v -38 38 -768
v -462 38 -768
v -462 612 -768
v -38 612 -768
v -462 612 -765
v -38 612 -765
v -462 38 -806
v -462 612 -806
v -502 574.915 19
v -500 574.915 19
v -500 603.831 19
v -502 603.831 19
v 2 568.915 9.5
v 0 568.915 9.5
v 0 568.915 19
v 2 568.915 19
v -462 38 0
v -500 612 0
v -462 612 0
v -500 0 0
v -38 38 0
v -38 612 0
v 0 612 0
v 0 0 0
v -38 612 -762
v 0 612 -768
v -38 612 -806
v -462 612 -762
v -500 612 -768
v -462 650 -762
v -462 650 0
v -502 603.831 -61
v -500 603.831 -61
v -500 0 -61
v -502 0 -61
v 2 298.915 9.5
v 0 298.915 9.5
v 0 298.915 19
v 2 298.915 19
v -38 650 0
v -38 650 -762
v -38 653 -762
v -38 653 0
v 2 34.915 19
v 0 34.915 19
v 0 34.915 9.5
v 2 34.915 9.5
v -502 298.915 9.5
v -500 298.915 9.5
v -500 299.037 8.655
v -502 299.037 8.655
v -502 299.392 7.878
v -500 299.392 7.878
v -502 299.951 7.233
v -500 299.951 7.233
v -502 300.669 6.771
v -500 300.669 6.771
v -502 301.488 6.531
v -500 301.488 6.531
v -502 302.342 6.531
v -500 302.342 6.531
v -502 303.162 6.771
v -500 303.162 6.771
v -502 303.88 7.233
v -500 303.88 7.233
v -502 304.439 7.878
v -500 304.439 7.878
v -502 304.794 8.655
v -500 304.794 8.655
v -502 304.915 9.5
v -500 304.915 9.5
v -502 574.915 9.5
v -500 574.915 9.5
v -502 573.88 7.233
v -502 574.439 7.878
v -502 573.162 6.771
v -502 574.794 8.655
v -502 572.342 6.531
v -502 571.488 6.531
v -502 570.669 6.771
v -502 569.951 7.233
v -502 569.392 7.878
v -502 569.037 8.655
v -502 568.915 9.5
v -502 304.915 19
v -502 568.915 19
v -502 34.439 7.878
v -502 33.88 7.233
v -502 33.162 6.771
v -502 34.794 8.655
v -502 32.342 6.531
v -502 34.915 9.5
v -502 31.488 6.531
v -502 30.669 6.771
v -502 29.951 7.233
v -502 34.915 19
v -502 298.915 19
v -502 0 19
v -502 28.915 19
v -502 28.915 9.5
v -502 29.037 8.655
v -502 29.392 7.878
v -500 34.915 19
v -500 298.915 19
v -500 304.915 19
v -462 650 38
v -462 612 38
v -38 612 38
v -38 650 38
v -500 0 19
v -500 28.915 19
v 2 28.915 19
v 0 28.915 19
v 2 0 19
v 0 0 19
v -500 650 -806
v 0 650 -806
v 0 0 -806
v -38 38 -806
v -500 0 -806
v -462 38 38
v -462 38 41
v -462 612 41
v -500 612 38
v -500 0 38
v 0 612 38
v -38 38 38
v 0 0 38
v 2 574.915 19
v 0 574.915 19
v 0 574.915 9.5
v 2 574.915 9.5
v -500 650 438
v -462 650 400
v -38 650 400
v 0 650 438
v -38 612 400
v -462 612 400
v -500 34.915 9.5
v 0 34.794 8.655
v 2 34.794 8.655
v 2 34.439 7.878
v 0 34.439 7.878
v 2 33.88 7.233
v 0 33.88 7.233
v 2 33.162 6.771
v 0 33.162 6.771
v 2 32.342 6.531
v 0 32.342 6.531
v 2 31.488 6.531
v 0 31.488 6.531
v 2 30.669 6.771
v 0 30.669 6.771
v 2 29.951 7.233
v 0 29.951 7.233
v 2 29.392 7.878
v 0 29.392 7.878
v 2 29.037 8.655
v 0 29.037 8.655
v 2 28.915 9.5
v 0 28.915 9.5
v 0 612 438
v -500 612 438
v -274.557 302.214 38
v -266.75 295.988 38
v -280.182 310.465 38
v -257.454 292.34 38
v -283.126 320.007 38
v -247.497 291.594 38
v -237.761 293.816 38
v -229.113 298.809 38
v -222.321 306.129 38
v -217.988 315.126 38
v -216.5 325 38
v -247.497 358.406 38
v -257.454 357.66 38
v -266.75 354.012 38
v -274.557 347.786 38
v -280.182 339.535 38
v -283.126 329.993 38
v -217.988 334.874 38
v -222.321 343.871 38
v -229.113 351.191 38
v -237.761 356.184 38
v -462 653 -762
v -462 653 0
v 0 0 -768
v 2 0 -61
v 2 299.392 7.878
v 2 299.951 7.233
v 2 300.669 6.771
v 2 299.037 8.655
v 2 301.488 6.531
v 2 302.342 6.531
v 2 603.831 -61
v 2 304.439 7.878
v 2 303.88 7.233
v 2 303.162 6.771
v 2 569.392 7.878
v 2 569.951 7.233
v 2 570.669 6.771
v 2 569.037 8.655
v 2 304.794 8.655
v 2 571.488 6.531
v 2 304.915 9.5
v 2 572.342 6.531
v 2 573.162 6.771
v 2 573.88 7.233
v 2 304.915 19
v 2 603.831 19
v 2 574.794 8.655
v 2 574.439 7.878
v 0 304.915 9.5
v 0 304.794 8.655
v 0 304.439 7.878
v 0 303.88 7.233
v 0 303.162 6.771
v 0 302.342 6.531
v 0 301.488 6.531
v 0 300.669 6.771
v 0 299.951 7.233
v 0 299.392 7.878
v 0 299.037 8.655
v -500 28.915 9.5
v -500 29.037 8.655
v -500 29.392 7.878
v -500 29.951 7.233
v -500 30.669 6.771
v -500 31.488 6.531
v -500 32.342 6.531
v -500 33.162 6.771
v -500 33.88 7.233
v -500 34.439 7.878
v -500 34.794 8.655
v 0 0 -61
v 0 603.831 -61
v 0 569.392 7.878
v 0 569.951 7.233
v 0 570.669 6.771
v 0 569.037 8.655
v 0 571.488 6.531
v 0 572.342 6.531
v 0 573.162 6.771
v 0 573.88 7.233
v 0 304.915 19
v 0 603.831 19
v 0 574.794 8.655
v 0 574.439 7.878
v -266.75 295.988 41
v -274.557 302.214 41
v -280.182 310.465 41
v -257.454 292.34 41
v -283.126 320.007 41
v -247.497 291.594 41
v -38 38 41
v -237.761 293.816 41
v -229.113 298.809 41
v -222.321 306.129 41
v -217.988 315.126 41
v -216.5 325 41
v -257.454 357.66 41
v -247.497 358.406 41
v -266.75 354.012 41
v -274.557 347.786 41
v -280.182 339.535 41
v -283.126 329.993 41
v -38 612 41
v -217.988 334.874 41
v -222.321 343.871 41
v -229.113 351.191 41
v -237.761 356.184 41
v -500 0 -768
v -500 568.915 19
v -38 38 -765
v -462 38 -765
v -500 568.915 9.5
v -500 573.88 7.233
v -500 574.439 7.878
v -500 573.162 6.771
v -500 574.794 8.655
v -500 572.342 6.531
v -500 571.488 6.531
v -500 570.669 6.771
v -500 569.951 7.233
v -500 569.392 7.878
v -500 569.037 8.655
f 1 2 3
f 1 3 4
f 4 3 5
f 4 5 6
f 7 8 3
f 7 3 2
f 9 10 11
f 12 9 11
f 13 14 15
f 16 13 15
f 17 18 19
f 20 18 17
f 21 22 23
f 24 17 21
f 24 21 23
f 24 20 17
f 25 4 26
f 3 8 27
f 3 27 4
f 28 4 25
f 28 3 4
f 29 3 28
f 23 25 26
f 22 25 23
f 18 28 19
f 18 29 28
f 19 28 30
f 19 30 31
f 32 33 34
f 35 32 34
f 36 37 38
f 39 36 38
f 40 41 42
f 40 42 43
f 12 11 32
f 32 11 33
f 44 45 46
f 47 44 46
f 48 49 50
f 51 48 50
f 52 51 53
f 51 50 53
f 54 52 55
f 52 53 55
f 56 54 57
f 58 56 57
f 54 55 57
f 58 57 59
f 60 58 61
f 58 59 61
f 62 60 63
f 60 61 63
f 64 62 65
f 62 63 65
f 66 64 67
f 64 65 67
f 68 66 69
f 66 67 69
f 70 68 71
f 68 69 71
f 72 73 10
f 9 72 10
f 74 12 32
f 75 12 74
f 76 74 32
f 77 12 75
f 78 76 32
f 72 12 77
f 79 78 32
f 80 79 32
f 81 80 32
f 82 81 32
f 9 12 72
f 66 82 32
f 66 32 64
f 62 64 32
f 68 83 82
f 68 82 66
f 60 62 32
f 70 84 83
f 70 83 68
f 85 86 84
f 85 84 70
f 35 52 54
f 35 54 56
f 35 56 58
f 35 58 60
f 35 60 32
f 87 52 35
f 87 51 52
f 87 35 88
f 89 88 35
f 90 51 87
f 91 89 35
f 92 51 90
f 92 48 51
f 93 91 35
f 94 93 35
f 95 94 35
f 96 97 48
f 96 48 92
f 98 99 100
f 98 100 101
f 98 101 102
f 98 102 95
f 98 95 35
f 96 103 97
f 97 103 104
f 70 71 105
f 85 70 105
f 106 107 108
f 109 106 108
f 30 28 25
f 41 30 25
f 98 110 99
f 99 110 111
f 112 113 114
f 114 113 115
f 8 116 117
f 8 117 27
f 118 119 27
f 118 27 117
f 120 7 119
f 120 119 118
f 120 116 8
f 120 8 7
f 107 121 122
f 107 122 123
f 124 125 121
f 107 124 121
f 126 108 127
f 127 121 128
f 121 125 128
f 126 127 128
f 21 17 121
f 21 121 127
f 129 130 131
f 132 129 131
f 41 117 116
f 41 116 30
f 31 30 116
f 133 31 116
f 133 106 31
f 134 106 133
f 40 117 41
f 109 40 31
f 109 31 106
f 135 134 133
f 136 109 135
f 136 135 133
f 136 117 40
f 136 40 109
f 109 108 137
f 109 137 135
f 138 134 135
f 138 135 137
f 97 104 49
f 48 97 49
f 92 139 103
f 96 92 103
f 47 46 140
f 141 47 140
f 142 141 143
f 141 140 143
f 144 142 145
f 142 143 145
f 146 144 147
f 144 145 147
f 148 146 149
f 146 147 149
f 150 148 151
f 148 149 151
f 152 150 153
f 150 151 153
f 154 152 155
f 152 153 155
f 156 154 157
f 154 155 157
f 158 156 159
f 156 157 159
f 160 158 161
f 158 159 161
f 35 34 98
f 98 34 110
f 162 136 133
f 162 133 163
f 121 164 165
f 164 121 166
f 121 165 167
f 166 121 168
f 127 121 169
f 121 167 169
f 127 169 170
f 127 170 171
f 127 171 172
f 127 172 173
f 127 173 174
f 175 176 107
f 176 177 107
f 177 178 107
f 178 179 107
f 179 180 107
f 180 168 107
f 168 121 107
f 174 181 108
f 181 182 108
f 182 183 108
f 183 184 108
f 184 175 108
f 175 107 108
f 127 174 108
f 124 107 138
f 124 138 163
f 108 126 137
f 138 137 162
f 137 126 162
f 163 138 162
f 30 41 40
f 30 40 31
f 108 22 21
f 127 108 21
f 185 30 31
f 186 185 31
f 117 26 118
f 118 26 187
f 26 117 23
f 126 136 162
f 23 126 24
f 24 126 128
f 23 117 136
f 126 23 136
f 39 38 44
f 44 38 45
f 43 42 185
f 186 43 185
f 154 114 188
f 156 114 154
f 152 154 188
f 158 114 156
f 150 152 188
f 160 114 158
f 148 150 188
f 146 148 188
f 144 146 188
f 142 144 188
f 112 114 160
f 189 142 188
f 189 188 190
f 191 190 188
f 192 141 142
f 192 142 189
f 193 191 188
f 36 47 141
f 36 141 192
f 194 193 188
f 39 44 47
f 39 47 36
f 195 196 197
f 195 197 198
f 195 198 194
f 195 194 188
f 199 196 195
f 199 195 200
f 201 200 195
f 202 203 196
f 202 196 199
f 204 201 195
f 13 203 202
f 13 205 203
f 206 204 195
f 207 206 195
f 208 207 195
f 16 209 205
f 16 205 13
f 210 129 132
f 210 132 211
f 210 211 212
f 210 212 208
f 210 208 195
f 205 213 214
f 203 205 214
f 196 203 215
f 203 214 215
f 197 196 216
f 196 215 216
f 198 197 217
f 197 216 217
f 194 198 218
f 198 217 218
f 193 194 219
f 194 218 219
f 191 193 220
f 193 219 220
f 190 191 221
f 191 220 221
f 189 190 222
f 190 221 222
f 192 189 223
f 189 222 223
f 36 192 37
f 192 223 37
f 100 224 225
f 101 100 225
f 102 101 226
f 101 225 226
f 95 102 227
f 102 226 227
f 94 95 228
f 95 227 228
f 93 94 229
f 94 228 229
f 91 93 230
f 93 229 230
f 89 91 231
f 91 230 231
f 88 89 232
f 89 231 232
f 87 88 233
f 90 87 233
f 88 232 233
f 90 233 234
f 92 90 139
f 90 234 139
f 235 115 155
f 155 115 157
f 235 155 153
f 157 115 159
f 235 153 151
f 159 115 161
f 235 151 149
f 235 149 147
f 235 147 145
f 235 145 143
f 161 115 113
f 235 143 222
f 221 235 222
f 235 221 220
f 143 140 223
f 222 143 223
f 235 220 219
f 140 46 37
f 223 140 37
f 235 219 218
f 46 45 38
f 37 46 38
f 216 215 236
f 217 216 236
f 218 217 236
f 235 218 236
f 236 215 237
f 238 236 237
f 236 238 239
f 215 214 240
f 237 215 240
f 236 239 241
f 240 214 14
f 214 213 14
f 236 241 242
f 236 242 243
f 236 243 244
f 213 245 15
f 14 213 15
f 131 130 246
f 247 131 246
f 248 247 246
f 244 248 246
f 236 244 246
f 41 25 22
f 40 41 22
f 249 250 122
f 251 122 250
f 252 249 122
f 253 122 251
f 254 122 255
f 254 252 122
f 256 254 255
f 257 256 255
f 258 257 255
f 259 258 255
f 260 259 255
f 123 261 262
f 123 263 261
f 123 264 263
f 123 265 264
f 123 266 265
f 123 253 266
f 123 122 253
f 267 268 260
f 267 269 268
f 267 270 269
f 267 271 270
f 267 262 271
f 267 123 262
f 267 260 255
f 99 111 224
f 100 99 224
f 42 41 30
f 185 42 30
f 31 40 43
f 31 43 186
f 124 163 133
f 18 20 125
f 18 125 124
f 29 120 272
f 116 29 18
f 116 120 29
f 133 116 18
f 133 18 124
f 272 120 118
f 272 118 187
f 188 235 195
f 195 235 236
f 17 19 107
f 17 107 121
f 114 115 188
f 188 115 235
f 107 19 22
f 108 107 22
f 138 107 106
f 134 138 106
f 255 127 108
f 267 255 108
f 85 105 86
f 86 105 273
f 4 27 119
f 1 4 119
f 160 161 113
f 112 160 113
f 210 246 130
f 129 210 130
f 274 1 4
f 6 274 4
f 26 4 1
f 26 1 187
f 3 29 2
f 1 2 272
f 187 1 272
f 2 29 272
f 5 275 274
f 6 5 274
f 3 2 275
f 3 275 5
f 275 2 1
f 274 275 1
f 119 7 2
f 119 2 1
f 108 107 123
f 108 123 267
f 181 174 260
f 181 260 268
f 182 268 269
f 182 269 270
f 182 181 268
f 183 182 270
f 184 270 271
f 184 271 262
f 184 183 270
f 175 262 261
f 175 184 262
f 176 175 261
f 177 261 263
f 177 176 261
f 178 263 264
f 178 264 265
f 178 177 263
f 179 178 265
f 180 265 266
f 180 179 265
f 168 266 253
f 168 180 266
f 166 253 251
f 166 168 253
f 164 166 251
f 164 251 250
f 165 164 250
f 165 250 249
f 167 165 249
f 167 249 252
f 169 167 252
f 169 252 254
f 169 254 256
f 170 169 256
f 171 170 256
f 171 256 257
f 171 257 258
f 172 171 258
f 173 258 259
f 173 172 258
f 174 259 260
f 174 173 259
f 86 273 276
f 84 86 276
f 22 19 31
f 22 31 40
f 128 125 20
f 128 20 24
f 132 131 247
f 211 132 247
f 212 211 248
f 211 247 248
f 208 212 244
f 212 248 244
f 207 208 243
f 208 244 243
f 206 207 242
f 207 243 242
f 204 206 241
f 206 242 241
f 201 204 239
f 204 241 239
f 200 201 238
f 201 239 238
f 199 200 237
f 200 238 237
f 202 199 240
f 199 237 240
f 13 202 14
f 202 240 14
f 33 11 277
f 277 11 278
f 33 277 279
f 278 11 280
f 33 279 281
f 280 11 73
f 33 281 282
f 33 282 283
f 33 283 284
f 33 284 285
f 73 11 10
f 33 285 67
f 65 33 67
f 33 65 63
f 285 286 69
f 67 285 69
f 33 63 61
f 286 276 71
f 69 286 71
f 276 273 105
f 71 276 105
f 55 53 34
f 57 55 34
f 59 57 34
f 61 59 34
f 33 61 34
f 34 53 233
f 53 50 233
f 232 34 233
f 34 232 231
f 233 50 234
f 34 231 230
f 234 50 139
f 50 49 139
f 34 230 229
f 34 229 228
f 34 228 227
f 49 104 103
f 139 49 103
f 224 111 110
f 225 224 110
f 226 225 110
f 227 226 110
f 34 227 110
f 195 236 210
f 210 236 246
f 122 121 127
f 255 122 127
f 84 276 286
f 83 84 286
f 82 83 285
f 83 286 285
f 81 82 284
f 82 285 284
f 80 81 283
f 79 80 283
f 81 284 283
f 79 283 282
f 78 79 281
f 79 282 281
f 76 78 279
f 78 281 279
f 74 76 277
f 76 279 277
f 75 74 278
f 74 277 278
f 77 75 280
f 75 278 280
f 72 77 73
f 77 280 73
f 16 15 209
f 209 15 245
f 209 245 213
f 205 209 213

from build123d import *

# Parameters (mm, degrees)
F0_W      = 500
F0_H      = 38
F1_DEPTH  = 650
F2_W      = 38
F2_H      = 806
F3_DEPTH  = 500
F4_W      = 650
F4_H      = 38
F5_DEPTH  = 500
F6_W      = 38
F6_H      = 38
F7_DEPTH  = 400
F8_W      = 38
F8_H      = 38
F9_DEPTH  = 424
F10_W     = 424
F10_H     = 762
F11_DEPTH = 41
F12_W     = 424
F12_H     = 574
F13_DEPTH = 38
F14_W     = 424
F14_H     = 574
F15_DEPTH = 38
F16_W     = 424
F16_H     = 762
F17_DEPTH = 3
F18_W     = 424
F18_H     = 574
F18_R     = 33.5
F19_DEPTH = 3
F20_W     = 424
F20_H     = 574
F21_DEPTH = 3
F22_W     = 603.8308376074
F22_H     = 61
F23_DEPTH = 2
F24_W     = 603.83084
F24_H     = 61
F25_DEPTH = 2


with BuildPart() as f1:
    # F0 (on Front) → F1 (new body)
    with BuildSketch(Plane.XZ):
        with Locations((-250, 19)):
            Rectangle(F0_W, F0_H)
    extrude(amount=-F1_DEPTH)

    # F2 (on face) → F3 (join)
    with BuildSketch(Plane(origin=(-500, 0, 0), x_dir=(0, -1, 0), z_dir=(-1, 0, 0))):
        with Locations((-631, -403)):
            Rectangle(F2_W, F2_H)
    extrude(amount=-F3_DEPTH)

    # F4 (on face) → F5 (join)
    with BuildSketch(Plane(origin=(-500, 0, 0), x_dir=(0, -1, 0), z_dir=(-1, 0, 0))):
        with Locations((-325, -787)):
            Rectangle(F4_W, F4_H)
    extrude(amount=-F5_DEPTH)

    # F6 (on face) → F7 (join)
    with BuildSketch(Plane.XY.offset(38)):
        with Locations((-481, 631)):
            Rectangle(F6_W, F6_H)
        with Locations((-19, 631)):
            Rectangle(F6_W, F6_H)
    extrude(amount=F7_DEPTH)

    # F8 (on face) → F9 (join)
    with BuildSketch(Plane(origin=(-38, 0, 0), x_dir=(0, -1, 0), z_dir=(-1, 0, 0))):
        with Locations((-631, 419)):
            Rectangle(F8_W, F8_H)
    extrude(amount=F9_DEPTH)

    # F10 (on face) → F11 (cut)
    with BuildSketch(Plane.XZ.offset(-612)):
        with Locations((-250, -381)):
            Rectangle(F10_W, F10_H)
    extrude(amount=-F11_DEPTH, mode=Mode.SUBTRACT)

    # F12 (on face) → F13 (cut)
    with BuildSketch(Plane(origin=(0, 0, 0), x_dir=(1, 0, 0), z_dir=(0, 0, -1))):
        with Locations((-250, -325)):
            Rectangle(F12_W, F12_H)
    extrude(amount=-F13_DEPTH, mode=Mode.SUBTRACT)

    # F14 (on face) → F15 (cut)
    with BuildSketch(Plane(origin=(0, 0, -806), x_dir=(1, 0, 0), z_dir=(0, 0, -1))):
        with Locations((-250, -325)):
            Rectangle(F14_W, F14_H)
    extrude(amount=-F15_DEPTH, mode=Mode.SUBTRACT)


with BuildPart() as f17:
    # F16 (on face) → F17 (new body)
    with BuildSketch(Plane(origin=(0, 650, 0), x_dir=(-1, 0, 0), z_dir=(0, 1, 0))):
        with Locations((250, -381)):
            Rectangle(F16_W, F16_H)
    extrude(amount=F17_DEPTH)


with BuildPart() as f19:
    # F18 (on face) → F19 (new body)
    with BuildSketch(Plane.XY.offset(38)):
        with Locations((-250, 325)):
            Rectangle(F18_W, F18_H)
        with Locations((-250, 325)):
            Circle(F18_R, mode=Mode.SUBTRACT)
    extrude(amount=F19_DEPTH)


with BuildPart() as f21:
    # F20 (on face) → F21 (new body)
    with BuildSketch(Plane.XY.offset(-768)):
        with Locations((-250, 325)):
            Rectangle(F20_W, F20_H)
    extrude(amount=F21_DEPTH)


with BuildPart() as f23:
    # F22 (on face) → F23 (new body)
    with BuildSketch(Plane.YZ):
        with Locations((301.9154188037, -30.5)):
            Rectangle(F22_W, F22_H)
        with BuildLine():
            Line((28.9154188037, 19), (0, 19))
            Line((0, 19), (0, 0))
            Line((0, 0), (603.8308376074, 0))
            Line((603.8308376074, 0), (603.8308376074, 19))
            Line((603.8308376074, 19), (574.9154188037, 19))
            Line((574.9154188037, 19), (574.9154188037, 9.5))
            ThreePointArc((574.9154188037, 9.5), (571.9154188037, 6.5), (568.9154188037, 9.5))
            Line((568.9154188037, 9.5), (568.9154188037, 19))
            Line((568.9154188037, 19), (304.9154188037, 19))
            Line((304.9154188037, 19), (304.9154188037, 9.5))
            ThreePointArc((304.9154188037, 9.5), (301.9154188037, 6.5), (298.9154188037, 9.5))
            Line((298.9154188037, 9.5), (298.9154188037, 19))
            Line((298.9154188037, 19), (34.9154188037, 19))
            Line((34.9154188037, 19), (34.9154188037, 9.5))
            ThreePointArc((34.9154188037, 9.5), (31.9154188037, 6.5), (28.9154188037, 9.5))
            Line((28.9154188037, 9.5), (28.9154188037, 19))
        make_face()
    extrude(amount=F23_DEPTH)


with BuildPart() as f25:
    # F24 (on face) → F25 (new body)
    with BuildSketch(Plane(origin=(-500, 0, 0), x_dir=(0, -1, 0), z_dir=(-1, 0, 0))):
        with Locations((-301.91542, -30.5)):
            Rectangle(F24_W, F24_H)
        with BuildLine():
            Line((0, 0), (0, 19))
            Line((0, 19), (-28.91542, 19))
            Line((-28.91542, 19), (-28.91542, 9.5))
            ThreePointArc((-28.91542, 9.5), (-31.91542, 6.5), (-34.91542, 9.5))
            Line((-34.91542, 9.5), (-34.91542, 19))
            Line((-34.91542, 19), (-298.91542, 19))
            Line((-298.91542, 19), (-298.91542, 9.5))
            ThreePointArc((-298.91542, 9.5), (-301.91542, 6.5), (-304.91542, 9.5))
            Line((-304.91542, 9.5), (-304.91542, 19))
            Line((-304.91542, 19), (-568.91542, 19))
            Line((-568.91542, 19), (-568.91542, 9.5))
            ThreePointArc((-568.91542, 9.5), (-571.91542, 6.5), (-574.91542, 9.5))
            Line((-574.91542, 9.5), (-574.91542, 19))
            Line((-574.91542, 19), (-603.83084, 19))
            Line((-603.83084, 19), (-603.83084, 0))
            Line((-603.83084, 0), (0, 0))
        make_face()
    extrude(amount=F25_DEPTH)


solid = Compound([f1.part, f17.part, f19.part, f21.part, f23.part, f25.part])
